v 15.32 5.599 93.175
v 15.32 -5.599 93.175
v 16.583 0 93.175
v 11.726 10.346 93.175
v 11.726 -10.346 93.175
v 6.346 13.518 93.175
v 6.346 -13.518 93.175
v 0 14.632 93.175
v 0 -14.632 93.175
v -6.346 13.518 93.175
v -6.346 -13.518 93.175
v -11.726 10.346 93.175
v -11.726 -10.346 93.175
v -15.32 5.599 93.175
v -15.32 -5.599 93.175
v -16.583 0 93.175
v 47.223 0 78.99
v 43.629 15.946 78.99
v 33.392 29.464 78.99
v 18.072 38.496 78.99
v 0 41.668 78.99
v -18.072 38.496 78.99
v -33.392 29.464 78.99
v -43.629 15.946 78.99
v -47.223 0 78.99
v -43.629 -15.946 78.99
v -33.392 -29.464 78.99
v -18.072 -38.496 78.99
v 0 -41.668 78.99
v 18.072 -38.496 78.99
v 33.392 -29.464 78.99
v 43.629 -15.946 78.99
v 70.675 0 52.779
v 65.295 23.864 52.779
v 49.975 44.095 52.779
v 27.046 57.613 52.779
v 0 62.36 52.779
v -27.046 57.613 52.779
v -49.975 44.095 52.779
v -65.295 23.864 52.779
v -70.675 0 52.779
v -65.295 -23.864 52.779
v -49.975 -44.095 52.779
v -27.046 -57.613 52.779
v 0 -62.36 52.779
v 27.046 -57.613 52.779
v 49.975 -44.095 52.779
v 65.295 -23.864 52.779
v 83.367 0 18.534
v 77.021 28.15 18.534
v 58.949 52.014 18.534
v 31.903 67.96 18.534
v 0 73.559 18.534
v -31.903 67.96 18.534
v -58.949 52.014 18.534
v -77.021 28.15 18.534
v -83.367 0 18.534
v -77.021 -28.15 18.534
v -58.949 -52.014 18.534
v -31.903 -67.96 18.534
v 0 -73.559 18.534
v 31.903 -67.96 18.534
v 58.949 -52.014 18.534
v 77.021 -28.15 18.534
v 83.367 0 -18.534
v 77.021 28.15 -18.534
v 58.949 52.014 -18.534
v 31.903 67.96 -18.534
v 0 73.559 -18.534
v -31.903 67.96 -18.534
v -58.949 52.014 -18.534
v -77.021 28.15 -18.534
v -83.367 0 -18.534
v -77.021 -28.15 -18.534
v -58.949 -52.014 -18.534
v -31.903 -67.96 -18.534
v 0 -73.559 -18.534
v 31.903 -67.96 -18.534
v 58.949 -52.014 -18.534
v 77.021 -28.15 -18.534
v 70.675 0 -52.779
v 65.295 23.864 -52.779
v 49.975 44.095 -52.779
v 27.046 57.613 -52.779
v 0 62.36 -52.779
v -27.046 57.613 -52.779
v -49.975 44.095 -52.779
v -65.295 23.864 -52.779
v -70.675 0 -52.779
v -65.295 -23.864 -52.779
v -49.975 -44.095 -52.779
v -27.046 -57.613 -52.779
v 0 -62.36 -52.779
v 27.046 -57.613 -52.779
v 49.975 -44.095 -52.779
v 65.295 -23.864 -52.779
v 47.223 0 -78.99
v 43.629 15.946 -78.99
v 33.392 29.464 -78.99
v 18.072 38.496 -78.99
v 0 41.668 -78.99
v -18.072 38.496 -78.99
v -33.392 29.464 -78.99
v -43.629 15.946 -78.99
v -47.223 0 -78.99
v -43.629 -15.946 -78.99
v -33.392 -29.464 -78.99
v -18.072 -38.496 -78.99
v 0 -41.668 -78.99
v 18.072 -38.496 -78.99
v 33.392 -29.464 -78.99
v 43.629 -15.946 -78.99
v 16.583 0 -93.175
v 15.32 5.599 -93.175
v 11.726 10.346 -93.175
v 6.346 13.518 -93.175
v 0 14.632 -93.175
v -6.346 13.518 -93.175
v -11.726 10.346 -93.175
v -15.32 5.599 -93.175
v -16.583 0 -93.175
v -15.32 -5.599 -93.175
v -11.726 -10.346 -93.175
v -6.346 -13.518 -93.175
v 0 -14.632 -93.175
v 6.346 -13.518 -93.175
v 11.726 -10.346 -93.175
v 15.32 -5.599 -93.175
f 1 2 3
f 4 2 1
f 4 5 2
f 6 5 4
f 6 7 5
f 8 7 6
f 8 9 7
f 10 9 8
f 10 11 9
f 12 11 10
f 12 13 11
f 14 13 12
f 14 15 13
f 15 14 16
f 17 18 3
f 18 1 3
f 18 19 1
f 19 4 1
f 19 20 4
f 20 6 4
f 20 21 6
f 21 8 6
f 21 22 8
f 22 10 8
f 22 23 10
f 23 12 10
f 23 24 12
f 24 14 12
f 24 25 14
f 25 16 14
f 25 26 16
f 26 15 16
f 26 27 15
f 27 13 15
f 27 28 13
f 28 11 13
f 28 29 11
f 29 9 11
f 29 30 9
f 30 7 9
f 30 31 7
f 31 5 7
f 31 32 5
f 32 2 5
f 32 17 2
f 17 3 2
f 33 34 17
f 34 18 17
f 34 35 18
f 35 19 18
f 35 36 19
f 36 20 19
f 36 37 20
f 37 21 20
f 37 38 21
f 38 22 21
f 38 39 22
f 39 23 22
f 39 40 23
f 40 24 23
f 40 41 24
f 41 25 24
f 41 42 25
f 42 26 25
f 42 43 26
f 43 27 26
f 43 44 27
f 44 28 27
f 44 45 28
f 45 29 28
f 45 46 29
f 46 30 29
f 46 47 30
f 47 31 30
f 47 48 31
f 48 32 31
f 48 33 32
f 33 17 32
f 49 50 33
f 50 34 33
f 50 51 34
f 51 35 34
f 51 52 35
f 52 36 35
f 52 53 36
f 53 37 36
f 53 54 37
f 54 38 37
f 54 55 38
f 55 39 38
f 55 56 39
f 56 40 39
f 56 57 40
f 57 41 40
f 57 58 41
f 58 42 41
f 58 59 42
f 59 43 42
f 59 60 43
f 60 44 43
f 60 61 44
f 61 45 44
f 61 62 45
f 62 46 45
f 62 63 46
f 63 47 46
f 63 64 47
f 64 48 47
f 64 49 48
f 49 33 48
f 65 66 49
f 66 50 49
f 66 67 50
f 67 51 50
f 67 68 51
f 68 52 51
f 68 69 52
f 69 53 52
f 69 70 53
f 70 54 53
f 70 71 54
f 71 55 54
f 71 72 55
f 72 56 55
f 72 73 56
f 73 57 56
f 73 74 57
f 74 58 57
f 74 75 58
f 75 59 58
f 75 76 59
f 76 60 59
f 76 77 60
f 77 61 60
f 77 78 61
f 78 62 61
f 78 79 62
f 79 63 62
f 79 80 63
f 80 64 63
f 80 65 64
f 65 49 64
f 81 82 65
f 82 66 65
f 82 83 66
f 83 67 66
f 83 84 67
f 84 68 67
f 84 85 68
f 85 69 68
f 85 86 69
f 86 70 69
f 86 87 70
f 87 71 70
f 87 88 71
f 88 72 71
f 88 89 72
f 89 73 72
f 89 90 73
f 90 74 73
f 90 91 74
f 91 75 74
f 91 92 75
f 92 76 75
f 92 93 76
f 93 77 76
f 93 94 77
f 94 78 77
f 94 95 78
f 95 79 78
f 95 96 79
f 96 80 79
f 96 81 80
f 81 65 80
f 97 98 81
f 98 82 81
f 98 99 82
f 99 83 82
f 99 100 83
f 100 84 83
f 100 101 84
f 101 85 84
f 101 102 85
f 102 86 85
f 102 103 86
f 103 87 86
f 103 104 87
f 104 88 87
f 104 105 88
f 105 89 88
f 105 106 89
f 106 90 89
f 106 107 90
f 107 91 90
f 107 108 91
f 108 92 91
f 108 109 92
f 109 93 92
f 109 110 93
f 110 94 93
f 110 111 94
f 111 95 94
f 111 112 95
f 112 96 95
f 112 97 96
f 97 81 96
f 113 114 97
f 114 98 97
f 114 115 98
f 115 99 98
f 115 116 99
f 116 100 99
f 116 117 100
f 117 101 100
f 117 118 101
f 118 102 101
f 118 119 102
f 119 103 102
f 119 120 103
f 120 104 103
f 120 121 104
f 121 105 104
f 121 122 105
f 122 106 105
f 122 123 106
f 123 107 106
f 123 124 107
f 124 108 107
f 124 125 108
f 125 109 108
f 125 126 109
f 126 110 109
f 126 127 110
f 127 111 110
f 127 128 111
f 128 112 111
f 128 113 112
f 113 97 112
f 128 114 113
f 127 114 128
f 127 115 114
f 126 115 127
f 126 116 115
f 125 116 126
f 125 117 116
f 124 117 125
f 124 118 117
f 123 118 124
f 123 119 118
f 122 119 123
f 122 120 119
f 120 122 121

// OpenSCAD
// Generated by SolidPython 1.0.1 on 2020-07-29 00:46:53


scale(v = [17, 15, 19]) {
	sphere(r = 5);
}
/***********************************************
*********      SolidPython code:      **********
************************************************
 
# import packages: SolidPython
from solid import *
from solid.utils import *
from itertools import chain, combinations, permutations


class Resize:

    def __init__(self, scad_file):
        self.scad_file = scad_file
        #self.scad_file = import_scad(scad_file)
        # cone/cylinder param:
        self.r1 = 0
        self.r2 = 0
        self.h = 0
        # rectangular prism param:
        self.w = 0
        self.l = 0
        # ellipse param:
        self.r = 0

    # import OpenScad code (file name corresponds to shape)


    # classify shape + parameters
    def assign(self, param1, param2, param3):
        if self.scad_file == 'cone.scad':
            self.r1 = param1
            self.r2 = param2
            self.h = param3
        elif self.scad_file == 'cylinder.scad':
            self.r1 = param1
            self.r2 = param2
            self.h = param3
        elif self.scad_file == 'rectangularPrism.scad':
            self.h = param1
            self.l = param2
            self.w = param3
        else:
            self.r = param1
            self.h = param2

    # resize parameters
    def iterate(self):
        x = range(3, 20, 2)
        i = 1
        if self.scad_file == 'cone.scad':
            tempList = list(permutations(x, 2))
            for temp in tempList:
                param1 = temp[0]
                param2 = temp[1]
                filepath = 'produced_scad_files/' + 'cone' + str(param1) + '_' + str(param2) + '_' + '.scad'
                scad_render_to_file(cylinder(h=param1, r1=param2, r2=0), filepath)

        elif self.scad_file == 'cylinder.scad':
            tempList = list(permutations(x, 3))
            for temp in tempList:
                param1 = temp[0]
                param2 = temp[1]
                filepath = 'produced_scad_files/' + 'cylinder' + str(param1) + '_' + str(param2) + '_' + '.scad'
                scad_render_to_file(cylinder(h=param1, r1=param2, r2=param2), filepath)

        elif self.scad_file == 'rectangularPrism.scad':
            tempList = list(permutations(x, 3))
            for temp in tempList:
                param1 = temp[0]
                param2 = temp[1]
                param3 = temp[2]
                filepath = 'produced_scad_files/' + 'rectangularPrism' + str(param1) + '_' + str(param2) + '_' + str(
                    param3) + '.scad'
                scad_render_to_file(cube(size=(param1, param2, param3)), filepath)

        elif self.scad_file == 'ellipse.scad':
            tempList = list(permutations(x, 4))
            for temp in tempList:
                param1 = temp[0]
                param2 = temp[1]
                param3 = temp[2]
                param4 = temp[3]
                filepath = 'produced_scad_files/' + 'ellipse' + str(param1) + '_' + str(param2) + '_' + str(param3) + '_' + str(param4) + '.scad'
                scad_render_to_file(scale([param1, param2, param3])(sphere(r=param4)), filepath)

    def render_to_scadfile(self):
        scad_render_to_file(scad, 'example.scad') 
 
************************************************/
